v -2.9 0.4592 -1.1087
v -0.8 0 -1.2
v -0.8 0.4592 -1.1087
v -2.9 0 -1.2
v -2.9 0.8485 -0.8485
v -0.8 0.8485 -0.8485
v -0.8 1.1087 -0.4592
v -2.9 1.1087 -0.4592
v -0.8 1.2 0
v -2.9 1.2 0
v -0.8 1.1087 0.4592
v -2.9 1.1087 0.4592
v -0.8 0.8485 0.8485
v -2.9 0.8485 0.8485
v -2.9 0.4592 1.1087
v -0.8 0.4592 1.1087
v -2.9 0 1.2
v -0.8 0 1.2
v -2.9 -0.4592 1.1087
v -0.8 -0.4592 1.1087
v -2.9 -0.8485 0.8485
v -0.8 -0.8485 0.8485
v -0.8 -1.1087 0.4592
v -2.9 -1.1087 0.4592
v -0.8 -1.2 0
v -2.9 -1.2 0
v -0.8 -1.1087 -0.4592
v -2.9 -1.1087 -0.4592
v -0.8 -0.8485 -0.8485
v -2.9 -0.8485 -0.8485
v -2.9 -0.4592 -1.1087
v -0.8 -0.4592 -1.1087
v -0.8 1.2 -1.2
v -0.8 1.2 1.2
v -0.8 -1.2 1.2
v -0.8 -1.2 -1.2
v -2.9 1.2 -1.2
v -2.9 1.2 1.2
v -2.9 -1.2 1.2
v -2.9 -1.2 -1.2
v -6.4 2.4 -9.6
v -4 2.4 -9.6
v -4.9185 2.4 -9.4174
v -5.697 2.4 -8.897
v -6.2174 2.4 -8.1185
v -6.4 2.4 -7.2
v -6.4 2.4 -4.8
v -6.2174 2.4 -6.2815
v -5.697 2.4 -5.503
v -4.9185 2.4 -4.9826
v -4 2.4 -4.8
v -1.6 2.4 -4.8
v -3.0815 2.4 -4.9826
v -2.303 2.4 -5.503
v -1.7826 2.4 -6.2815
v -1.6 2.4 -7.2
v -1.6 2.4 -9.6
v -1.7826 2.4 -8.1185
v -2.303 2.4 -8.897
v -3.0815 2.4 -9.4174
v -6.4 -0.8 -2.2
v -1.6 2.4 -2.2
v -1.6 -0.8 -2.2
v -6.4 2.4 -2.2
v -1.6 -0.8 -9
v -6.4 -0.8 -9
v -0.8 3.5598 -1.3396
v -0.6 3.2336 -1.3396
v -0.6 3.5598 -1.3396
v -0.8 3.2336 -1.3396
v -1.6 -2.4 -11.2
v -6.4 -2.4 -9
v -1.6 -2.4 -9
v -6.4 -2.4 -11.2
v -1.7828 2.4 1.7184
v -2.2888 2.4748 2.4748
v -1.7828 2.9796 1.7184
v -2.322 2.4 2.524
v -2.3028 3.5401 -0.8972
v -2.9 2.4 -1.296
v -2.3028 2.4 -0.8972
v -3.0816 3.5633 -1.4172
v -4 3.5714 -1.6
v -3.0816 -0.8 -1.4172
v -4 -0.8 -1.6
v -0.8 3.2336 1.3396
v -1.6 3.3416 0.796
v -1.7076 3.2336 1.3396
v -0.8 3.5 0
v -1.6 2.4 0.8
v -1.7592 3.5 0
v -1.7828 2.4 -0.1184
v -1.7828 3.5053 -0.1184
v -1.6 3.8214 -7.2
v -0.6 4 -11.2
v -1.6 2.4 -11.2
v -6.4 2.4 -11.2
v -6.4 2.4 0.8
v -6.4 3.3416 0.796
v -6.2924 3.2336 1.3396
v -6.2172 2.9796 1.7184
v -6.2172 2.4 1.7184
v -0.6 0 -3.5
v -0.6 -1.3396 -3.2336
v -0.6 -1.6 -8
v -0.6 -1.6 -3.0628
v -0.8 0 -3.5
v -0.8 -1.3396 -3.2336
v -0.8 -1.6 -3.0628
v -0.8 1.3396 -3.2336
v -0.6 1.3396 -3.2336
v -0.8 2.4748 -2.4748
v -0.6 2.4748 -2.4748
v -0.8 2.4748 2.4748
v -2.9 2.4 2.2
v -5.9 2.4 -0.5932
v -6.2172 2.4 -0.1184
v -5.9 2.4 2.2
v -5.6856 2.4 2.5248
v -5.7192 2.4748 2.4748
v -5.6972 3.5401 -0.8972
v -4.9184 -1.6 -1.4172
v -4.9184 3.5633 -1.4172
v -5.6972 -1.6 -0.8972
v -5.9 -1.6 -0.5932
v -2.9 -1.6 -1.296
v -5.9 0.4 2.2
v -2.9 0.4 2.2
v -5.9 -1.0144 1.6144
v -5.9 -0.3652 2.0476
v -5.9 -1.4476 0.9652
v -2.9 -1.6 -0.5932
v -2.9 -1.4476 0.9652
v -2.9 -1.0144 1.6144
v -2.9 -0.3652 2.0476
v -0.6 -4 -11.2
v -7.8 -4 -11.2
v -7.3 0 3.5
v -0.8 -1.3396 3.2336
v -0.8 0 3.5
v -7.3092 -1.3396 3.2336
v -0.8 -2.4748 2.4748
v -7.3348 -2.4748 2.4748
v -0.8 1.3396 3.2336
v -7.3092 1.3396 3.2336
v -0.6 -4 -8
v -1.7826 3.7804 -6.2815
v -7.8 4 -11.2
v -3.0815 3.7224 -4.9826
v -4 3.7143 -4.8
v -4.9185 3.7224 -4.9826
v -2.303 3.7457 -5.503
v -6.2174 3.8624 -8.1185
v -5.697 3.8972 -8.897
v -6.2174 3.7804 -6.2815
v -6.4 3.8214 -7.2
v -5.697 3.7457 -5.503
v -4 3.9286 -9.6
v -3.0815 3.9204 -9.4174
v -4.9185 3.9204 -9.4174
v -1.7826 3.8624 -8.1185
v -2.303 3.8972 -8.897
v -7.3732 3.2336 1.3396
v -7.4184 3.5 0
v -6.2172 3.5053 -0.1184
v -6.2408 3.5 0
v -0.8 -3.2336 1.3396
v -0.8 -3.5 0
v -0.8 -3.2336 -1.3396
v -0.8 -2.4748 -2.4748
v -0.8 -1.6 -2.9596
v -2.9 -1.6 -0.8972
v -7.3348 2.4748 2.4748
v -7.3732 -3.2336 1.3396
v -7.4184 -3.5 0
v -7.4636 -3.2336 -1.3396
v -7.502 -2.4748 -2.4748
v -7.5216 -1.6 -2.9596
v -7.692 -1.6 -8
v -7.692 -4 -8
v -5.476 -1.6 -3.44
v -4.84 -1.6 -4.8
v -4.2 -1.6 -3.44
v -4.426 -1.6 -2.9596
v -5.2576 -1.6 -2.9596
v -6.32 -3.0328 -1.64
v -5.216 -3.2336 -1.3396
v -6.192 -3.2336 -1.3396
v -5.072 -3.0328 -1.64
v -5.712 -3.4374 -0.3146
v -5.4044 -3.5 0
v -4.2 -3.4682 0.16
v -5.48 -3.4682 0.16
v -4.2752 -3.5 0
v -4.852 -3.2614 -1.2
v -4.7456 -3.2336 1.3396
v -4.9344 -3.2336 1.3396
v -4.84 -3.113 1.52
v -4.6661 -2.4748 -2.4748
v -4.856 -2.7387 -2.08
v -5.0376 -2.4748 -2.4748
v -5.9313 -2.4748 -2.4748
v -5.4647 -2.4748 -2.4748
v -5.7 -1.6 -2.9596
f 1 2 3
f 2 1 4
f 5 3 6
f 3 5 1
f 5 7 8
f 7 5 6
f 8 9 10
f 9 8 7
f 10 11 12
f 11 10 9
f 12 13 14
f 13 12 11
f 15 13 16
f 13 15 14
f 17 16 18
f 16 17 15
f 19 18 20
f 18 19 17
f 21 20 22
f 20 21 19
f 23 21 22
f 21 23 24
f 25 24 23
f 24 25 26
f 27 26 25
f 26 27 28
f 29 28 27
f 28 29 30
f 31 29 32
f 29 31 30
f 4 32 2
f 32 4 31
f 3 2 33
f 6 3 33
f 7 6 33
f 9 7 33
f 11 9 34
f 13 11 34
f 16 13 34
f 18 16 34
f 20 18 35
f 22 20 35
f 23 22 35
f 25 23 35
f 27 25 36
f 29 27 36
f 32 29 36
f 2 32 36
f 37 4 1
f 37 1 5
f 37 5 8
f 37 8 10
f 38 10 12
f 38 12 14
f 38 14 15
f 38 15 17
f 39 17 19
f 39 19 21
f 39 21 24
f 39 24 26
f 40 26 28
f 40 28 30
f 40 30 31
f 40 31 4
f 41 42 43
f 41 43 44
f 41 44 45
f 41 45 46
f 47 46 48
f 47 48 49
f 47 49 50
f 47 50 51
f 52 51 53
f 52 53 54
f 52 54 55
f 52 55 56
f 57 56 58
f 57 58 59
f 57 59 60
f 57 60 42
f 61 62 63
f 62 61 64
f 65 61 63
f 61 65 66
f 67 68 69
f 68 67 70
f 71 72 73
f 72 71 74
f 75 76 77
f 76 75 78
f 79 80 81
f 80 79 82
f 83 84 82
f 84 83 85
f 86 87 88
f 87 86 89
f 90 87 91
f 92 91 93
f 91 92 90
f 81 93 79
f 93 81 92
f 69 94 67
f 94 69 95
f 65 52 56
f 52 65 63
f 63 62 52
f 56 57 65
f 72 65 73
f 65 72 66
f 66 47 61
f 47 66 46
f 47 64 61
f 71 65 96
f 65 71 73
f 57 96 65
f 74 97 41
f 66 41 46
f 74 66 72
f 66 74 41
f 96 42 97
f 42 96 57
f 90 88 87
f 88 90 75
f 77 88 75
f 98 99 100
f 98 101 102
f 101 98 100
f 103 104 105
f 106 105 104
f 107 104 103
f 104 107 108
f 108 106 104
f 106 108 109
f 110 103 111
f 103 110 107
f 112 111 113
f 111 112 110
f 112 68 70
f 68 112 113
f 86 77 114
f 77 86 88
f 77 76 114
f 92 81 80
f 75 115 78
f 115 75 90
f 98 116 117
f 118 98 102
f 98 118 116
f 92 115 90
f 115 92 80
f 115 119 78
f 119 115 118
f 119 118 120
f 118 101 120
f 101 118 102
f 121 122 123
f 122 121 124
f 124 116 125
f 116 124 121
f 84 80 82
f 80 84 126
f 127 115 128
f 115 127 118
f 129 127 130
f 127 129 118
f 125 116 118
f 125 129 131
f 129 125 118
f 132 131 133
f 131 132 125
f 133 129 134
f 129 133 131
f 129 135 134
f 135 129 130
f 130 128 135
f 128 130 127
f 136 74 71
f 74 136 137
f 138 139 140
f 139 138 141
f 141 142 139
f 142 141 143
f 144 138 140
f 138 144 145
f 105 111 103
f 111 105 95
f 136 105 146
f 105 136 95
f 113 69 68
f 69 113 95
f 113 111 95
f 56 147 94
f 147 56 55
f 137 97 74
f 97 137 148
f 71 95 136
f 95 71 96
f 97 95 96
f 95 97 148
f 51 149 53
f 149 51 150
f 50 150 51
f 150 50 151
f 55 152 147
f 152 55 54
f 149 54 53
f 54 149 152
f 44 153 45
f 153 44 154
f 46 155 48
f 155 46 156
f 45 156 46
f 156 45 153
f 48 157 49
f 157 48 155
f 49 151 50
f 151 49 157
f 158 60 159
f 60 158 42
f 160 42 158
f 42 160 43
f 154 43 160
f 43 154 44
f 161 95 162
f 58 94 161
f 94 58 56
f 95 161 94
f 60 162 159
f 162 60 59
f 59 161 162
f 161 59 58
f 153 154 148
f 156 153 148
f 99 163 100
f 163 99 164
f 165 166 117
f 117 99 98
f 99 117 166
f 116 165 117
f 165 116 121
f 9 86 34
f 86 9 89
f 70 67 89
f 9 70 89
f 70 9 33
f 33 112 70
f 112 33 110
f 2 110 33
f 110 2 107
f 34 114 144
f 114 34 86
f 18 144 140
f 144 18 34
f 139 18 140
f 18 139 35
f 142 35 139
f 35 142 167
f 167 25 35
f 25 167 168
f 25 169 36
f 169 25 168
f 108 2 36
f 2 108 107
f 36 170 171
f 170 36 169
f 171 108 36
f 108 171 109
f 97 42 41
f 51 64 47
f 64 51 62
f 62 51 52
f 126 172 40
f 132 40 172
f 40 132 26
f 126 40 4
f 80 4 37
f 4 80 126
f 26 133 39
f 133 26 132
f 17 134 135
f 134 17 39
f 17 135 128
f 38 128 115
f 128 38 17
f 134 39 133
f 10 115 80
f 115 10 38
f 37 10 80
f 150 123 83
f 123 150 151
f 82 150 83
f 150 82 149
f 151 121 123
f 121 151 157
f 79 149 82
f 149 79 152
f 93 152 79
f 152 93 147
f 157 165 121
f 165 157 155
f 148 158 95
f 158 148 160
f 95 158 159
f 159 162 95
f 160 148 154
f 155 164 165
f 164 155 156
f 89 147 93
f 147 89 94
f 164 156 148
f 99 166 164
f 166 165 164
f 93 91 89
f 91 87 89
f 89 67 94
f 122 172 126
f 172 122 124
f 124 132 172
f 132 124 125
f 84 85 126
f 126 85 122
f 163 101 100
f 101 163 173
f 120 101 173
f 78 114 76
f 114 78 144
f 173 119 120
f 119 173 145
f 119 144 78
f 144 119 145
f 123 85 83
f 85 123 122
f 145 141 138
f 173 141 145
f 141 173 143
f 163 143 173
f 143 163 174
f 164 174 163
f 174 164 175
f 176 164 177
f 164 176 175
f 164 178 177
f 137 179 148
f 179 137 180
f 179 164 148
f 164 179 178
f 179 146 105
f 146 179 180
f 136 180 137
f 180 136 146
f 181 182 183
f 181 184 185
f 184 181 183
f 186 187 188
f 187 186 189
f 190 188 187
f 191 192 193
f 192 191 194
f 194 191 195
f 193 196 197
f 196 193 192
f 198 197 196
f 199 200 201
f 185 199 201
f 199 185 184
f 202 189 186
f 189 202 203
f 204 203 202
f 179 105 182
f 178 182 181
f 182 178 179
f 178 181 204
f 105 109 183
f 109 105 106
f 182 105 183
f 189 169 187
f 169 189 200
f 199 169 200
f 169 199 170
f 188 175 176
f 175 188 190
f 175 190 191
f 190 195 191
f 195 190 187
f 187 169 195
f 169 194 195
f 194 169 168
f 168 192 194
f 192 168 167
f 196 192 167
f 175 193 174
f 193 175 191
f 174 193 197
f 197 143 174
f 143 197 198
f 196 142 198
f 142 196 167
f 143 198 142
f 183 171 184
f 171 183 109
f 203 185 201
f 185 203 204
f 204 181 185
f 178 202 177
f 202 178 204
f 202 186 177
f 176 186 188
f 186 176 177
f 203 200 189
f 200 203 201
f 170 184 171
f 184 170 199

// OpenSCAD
use <../lib.scad>
use <s/3817bs01.scad>
function ldraw_lib__3816bpba() = [
// 0 ~Minifig Leg Right with  3 Black Diamonds Pattern (Obsolete)
// 0 Name: 3816bpba.dat
// 0 Author: Magnus Forsberg [MagFors]
// 0 !LDRAW_ORG Part UPDATE 2023-03
// 0 !LICENSE Licensed under CC BY 4.0 : see CAreadme.txt
// 
// 0 !HELP Move down 12 units to align with hips
// 
// 0 BFC CERTIFY CCW
  [0,"BFC","CERTIFY"],
  [0,"BFC","CCW"],
// 
// 0 !KEYWORDS 2006, Batman, bricklink 970d03pb01, Harley Quinn, set 7886
// 
// 0 !HISTORY 2013-12-23 [MagFors] Original design as 3816pba
// 0 !HISTORY 2020-06-14 [MagFors] Adapted to corrected geometry
// 0 !HISTORY 2020-12-29 [PTadmin] Official Update 2020-03
// 0 !HISTORY 2023-05-29 [Holly-Wood] Obsoleted due to bad geometry
// 0 !HISTORY 2023-06-24 [OrionP] Official Update 2023-03
// 
// 
// 1 16 0 0 0 -1 0 0 0 1 0 0 0 1 s\3817bs01.dat
  [1,16,0,0,0,-1,0,0,0,1,0,0,0,1, ldraw_lib__s__3817bs01()],
// 4 16 -19.23 20 -4 -19.23 20 -10 -1.5 20 -10 -1.5 20 -4
  [4,16,-19.23,20,-4,-19.23,20,-10,-1.5,20,-10,-1.5,20,-4],
// 4 16 -19.23 20 -10 -19.5 28 -10 -1.5 28 -10 -1.5 20 -10
  [4,16,-19.23,20,-10,-19.5,28,-10,-1.5,28,-10,-1.5,20,-10],
// 5 24 -2 3.349 -8.084 -18.659 3.349 -8.084 -2 0 -8.75 -2 6.187 -6.187
  [5,24,-2,3.349,-8.084,-18.659,3.349,-8.084,-2,0,-8.75,-2,6.187,-6.187],
// 5 24 -2 6.187 -6.187 -18.755 6.187 -6.187 -2 7.399 -4 -2 3.349 -8.084
  [5,24,-2,6.187,-6.187,-18.755,6.187,-6.187,-2,7.399,-4,-2,3.349,-8.084],
// 5 24 -2 0 -8.75 -18.546 0 -8.75 -2 3.349 -8.084 -2 -3.349 -8.084
  [5,24,-2,0,-8.75,-18.546,0,-8.75,-2,3.349,-8.084,-2,-3.349,-8.084],
// 5 24 -2 -3.349 -8.084 -18.433 -3.349 -8.084 -2 0 -8.75 -2 -6.187 -6.187
  [5,24,-2,-3.349,-8.084,-18.433,-3.349,-8.084,-2,0,-8.75,-2,-6.187,-6.187],
// 
// 0 // Pattern
// 3 0 -13.69 8.6 -4 -12.1 12 -4 -10.5 8.6 -4
  [3,0,-13.69,8.6,-4,-12.1,12,-4,-10.5,8.6,-4],
// 4 0 -13.1439 7.399 -4 -13.69 8.6 -4 -10.5 8.6 -4 -11.0651 7.399 -4
  [4,0,-13.1439,7.399,-4,-13.69,8.6,-4,-10.5,8.6,-4,-11.0651,7.399,-4],
// 4 0 -15.48 3.349 -8.084 -15.8 4.1 -7.582 -12.68 4.1 -7.582 -13.04 3.349 -8.084
  [4,0,-15.48,3.349,-8.084,-15.8,4.1,-7.582,-12.68,4.1,-7.582,-13.04,3.349,-8.084],
// 3 0 -14.28 0.7866 -8.5936 -15.48 3.349 -8.084 -13.04 3.349 -8.084
  [3,0,-14.28,0.7866,-8.5936,-15.48,3.349,-8.084,-13.04,3.349,-8.084],
// 4 0 -10.5 -0.4 -8.6705 -13.7 -0.4 -8.6705 -13.511 0 -8.75 -10.688 0 -8.75
  [4,0,-10.5,-0.4,-8.6705,-13.7,-0.4,-8.6705,-13.511,0,-8.75,-10.688,0,-8.75],
// 3 0 -10.688 0 -8.75 -13.511 0 -8.75 -12.13 3 -8.1534
  [3,0,-10.688,0,-8.75,-13.511,0,-8.75,-12.13,3,-8.1534],
// 4 0 -12.336 -3.349 -8.084 -13.7 -0.4 -8.6705 -10.5 -0.4 -8.6705 -11.864 -3.349 -8.084
  [4,0,-12.336,-3.349,-8.084,-13.7,-0.4,-8.6705,-10.5,-0.4,-8.6705,-11.864,-3.349,-8.084],
// 3 0 -12.1 -3.8 -7.7825 -12.336 -3.349 -8.084 -11.864 -3.349 -8.084
  [3,0,-12.1,-3.8,-7.7825,-12.336,-3.349,-8.084,-11.864,-3.349,-8.084],
// 3 0 -11.6653 6.187 -6.187 -12.14 5.2 -6.8467 -12.594 6.187 -6.187
  [3,0,-11.6653,6.187,-6.187,-12.14,5.2,-6.8467,-12.594,6.187,-6.187],
// 4 0 -13.1439 7.399 -4 -11.0651 7.399 -4 -11.6653 6.187 -6.187 -12.594 6.187 -6.187
  [4,0,-13.1439,7.399,-4,-11.0651,7.399,-4,-11.6653,6.187,-6.187,-12.594,6.187,-6.187],
// 4 0 -15.8 4.1 -7.582 -14.8282 6.187 -6.187 -13.6618 6.187 -6.187 -12.68 4.1 -7.582
  [4,0,-15.8,4.1,-7.582,-14.8282,6.187,-6.187,-13.6618,6.187,-6.187,-12.68,4.1,-7.582],
// 3 0 -14.25 7.399 -4 -13.6618 6.187 -6.187 -14.8282 6.187 -6.187
  [3,0,-14.25,7.399,-4,-13.6618,6.187,-6.187,-14.8282,6.187,-6.187],
// 3 16 -19.23 20 -4 -1.5 20 -4 -12.1 12 -4
  [3,16,-19.23,20,-4,-1.5,20,-4,-12.1,12,-4],
// 4 16 -19.23 20 -4 -12.1 12 -4 -13.69 8.6 -4 -18.804 7.399 -4
  [4,16,-19.23,20,-4,-12.1,12,-4,-13.69,8.6,-4,-18.804,7.399,-4],
// 3 16 -18.804 7.399 -4 -13.69 8.6 -4 -14.25 7.399 -4
  [3,16,-18.804,7.399,-4,-13.69,8.6,-4,-14.25,7.399,-4],
// 4 16 -1.5 20 -4 -1.5 7.657 -4 -2 7.657 -4 -10.5 8.6 -4
  [4,16,-1.5,20,-4,-1.5,7.657,-4,-2,7.657,-4,-10.5,8.6,-4],
// 3 16 -12.1 12 -4 -1.5 20 -4 -10.5 8.6 -4
  [3,16,-12.1,12,-4,-1.5,20,-4,-10.5,8.6,-4],
// 4 16 -13.04 3.349 -8.084 -12.68 4.1 -7.582 -12.14 5.2 -6.8467 -2 3.349 -8.084
  [4,16,-13.04,3.349,-8.084,-12.68,4.1,-7.582,-12.14,5.2,-6.8467,-2,3.349,-8.084],
// 4 16 -2 3.349 -8.084 -12.14 5.2 -6.8467 -11.6653 6.187 -6.187 -2 6.187 -6.187
  [4,16,-2,3.349,-8.084,-12.14,5.2,-6.8467,-11.6653,6.187,-6.187,-2,6.187,-6.187],
// 4 16 -18.546 0 -8.75 -18.659 3.349 -8.084 -15.48 3.349 -8.084 -14.28 0.7866 -8.5936
  [4,16,-18.546,0,-8.75,-18.659,3.349,-8.084,-15.48,3.349,-8.084,-14.28,0.7866,-8.5936],
// 3 16 -18.546 0 -8.75 -14.28 0.7866 -8.5936 -13.511 0 -8.75
  [3,16,-18.546,0,-8.75,-14.28,0.7866,-8.5936,-13.511,0,-8.75],
// 4 16 -14.28 0.7866 -8.5936 -13.04 3.349 -8.084 -12.13 3 -8.1534 -13.511 0 -8.75
  [4,16,-14.28,0.7866,-8.5936,-13.04,3.349,-8.084,-12.13,3,-8.1534,-13.511,0,-8.75],
// 3 16 -13.04 3.349 -8.084 -2 3.349 -8.084 -12.13 3 -8.1534
  [3,16,-13.04,3.349,-8.084,-2,3.349,-8.084,-12.13,3,-8.1534],
// 4 16 -10.688 0 -8.75 -12.13 3 -8.1534 -2 3.349 -8.084 -2 0 -8.75
  [4,16,-10.688,0,-8.75,-12.13,3,-8.1534,-2,3.349,-8.084,-2,0,-8.75],
// 4 16 -10.5 -0.4 -8.6705 -10.688 0 -8.75 -2 0 -8.75 -2 -3.349 -8.084
  [4,16,-10.5,-0.4,-8.6705,-10.688,0,-8.75,-2,0,-8.75,-2,-3.349,-8.084],
// 3 16 -11.864 -3.349 -8.084 -10.5 -0.4 -8.6705 -2 -3.349 -8.084
  [3,16,-11.864,-3.349,-8.084,-10.5,-0.4,-8.6705,-2,-3.349,-8.084],
// 4 16 -18.546 0 -8.75 -13.511 0 -8.75 -13.7 -0.4 -8.6705 -18.433 -3.349 -8.084
  [4,16,-18.546,0,-8.75,-13.511,0,-8.75,-13.7,-0.4,-8.6705,-18.433,-3.349,-8.084],
// 3 16 -18.433 -3.349 -8.084 -13.7 -0.4 -8.6705 -12.336 -3.349 -8.084
  [3,16,-18.433,-3.349,-8.084,-13.7,-0.4,-8.6705,-12.336,-3.349,-8.084],
// 4 16 -18.337 -6.187 -6.187 -18.433 -3.349 -8.084 -12.336 -3.349 -8.084 -12.1 -3.8 -7.7825
  [4,16,-18.337,-6.187,-6.187,-18.433,-3.349,-8.084,-12.336,-3.349,-8.084,-12.1,-3.8,-7.7825],
// 4 16 -12.1 -3.8 -7.7825 -11.864 -3.349 -8.084 -2 -3.349 -8.084 -2 -6.187 -6.187
  [4,16,-12.1,-3.8,-7.7825,-11.864,-3.349,-8.084,-2,-3.349,-8.084,-2,-6.187,-6.187],
// 3 16 -18.337 -6.187 -6.187 -12.1 -3.8 -7.7825 -2 -6.187 -6.187
  [3,16,-18.337,-6.187,-6.187,-12.1,-3.8,-7.7825,-2,-6.187,-6.187],
// 4 16 -10.5 8.6 -4 -2 7.657 -4 -2 7.399 -4 -11.0651 7.399 -4
  [4,16,-10.5,8.6,-4,-2,7.657,-4,-2,7.399,-4,-11.0651,7.399,-4],
// 4 16 -13.6618 6.187 -6.187 -14.25 7.399 -4 -13.1439 7.399 -4 -12.594 6.187 -6.187
  [4,16,-13.6618,6.187,-6.187,-14.25,7.399,-4,-13.1439,7.399,-4,-12.594,6.187,-6.187],
// 3 16 -14.25 7.399 -4 -13.69 8.6 -4 -13.1439 7.399 -4
  [3,16,-14.25,7.399,-4,-13.69,8.6,-4,-13.1439,7.399,-4],
// 4 16 -18.804 7.399 -4 -14.25 7.399 -4 -14.8282 6.187 -6.187 -18.755 6.187 -6.187
  [4,16,-18.804,7.399,-4,-14.25,7.399,-4,-14.8282,6.187,-6.187,-18.755,6.187,-6.187],
// 3 16 -14.8282 6.187 -6.187 -15.8 4.1 -7.582 -18.755 6.187 -6.187
  [3,16,-14.8282,6.187,-6.187,-15.8,4.1,-7.582,-18.755,6.187,-6.187],
// 4 16 -15.8 4.1 -7.582 -15.48 3.349 -8.084 -18.659 3.349 -8.084 -18.755 6.187 -6.187
  [4,16,-15.8,4.1,-7.582,-15.48,3.349,-8.084,-18.659,3.349,-8.084,-18.755,6.187,-6.187],
// 4 16 -13.6618 6.187 -6.187 -12.594 6.187 -6.187 -12.14 5.2 -6.8467 -12.68 4.1 -7.582
  [4,16,-13.6618,6.187,-6.187,-12.594,6.187,-6.187,-12.14,5.2,-6.8467,-12.68,4.1,-7.582],
// 4 16 -11.6653 6.187 -6.187 -11.0651 7.399 -4 -2 7.399 -4 -2 6.187 -6.187
  [4,16,-11.6653,6.187,-6.187,-11.0651,7.399,-4,-2,7.399,-4,-2,6.187,-6.187],
];
module ldraw_lib__3816bpba(step=0, col=false, unit=2/5, alt=false, line=0.2, solid=!$preview)
    makepoly(ldraw_lib__3816bpba(), step=step, col=col, unit=unit, alt=alt, line=line, solid=solid);
ldraw_lib__3816bpba(line=0.2);
